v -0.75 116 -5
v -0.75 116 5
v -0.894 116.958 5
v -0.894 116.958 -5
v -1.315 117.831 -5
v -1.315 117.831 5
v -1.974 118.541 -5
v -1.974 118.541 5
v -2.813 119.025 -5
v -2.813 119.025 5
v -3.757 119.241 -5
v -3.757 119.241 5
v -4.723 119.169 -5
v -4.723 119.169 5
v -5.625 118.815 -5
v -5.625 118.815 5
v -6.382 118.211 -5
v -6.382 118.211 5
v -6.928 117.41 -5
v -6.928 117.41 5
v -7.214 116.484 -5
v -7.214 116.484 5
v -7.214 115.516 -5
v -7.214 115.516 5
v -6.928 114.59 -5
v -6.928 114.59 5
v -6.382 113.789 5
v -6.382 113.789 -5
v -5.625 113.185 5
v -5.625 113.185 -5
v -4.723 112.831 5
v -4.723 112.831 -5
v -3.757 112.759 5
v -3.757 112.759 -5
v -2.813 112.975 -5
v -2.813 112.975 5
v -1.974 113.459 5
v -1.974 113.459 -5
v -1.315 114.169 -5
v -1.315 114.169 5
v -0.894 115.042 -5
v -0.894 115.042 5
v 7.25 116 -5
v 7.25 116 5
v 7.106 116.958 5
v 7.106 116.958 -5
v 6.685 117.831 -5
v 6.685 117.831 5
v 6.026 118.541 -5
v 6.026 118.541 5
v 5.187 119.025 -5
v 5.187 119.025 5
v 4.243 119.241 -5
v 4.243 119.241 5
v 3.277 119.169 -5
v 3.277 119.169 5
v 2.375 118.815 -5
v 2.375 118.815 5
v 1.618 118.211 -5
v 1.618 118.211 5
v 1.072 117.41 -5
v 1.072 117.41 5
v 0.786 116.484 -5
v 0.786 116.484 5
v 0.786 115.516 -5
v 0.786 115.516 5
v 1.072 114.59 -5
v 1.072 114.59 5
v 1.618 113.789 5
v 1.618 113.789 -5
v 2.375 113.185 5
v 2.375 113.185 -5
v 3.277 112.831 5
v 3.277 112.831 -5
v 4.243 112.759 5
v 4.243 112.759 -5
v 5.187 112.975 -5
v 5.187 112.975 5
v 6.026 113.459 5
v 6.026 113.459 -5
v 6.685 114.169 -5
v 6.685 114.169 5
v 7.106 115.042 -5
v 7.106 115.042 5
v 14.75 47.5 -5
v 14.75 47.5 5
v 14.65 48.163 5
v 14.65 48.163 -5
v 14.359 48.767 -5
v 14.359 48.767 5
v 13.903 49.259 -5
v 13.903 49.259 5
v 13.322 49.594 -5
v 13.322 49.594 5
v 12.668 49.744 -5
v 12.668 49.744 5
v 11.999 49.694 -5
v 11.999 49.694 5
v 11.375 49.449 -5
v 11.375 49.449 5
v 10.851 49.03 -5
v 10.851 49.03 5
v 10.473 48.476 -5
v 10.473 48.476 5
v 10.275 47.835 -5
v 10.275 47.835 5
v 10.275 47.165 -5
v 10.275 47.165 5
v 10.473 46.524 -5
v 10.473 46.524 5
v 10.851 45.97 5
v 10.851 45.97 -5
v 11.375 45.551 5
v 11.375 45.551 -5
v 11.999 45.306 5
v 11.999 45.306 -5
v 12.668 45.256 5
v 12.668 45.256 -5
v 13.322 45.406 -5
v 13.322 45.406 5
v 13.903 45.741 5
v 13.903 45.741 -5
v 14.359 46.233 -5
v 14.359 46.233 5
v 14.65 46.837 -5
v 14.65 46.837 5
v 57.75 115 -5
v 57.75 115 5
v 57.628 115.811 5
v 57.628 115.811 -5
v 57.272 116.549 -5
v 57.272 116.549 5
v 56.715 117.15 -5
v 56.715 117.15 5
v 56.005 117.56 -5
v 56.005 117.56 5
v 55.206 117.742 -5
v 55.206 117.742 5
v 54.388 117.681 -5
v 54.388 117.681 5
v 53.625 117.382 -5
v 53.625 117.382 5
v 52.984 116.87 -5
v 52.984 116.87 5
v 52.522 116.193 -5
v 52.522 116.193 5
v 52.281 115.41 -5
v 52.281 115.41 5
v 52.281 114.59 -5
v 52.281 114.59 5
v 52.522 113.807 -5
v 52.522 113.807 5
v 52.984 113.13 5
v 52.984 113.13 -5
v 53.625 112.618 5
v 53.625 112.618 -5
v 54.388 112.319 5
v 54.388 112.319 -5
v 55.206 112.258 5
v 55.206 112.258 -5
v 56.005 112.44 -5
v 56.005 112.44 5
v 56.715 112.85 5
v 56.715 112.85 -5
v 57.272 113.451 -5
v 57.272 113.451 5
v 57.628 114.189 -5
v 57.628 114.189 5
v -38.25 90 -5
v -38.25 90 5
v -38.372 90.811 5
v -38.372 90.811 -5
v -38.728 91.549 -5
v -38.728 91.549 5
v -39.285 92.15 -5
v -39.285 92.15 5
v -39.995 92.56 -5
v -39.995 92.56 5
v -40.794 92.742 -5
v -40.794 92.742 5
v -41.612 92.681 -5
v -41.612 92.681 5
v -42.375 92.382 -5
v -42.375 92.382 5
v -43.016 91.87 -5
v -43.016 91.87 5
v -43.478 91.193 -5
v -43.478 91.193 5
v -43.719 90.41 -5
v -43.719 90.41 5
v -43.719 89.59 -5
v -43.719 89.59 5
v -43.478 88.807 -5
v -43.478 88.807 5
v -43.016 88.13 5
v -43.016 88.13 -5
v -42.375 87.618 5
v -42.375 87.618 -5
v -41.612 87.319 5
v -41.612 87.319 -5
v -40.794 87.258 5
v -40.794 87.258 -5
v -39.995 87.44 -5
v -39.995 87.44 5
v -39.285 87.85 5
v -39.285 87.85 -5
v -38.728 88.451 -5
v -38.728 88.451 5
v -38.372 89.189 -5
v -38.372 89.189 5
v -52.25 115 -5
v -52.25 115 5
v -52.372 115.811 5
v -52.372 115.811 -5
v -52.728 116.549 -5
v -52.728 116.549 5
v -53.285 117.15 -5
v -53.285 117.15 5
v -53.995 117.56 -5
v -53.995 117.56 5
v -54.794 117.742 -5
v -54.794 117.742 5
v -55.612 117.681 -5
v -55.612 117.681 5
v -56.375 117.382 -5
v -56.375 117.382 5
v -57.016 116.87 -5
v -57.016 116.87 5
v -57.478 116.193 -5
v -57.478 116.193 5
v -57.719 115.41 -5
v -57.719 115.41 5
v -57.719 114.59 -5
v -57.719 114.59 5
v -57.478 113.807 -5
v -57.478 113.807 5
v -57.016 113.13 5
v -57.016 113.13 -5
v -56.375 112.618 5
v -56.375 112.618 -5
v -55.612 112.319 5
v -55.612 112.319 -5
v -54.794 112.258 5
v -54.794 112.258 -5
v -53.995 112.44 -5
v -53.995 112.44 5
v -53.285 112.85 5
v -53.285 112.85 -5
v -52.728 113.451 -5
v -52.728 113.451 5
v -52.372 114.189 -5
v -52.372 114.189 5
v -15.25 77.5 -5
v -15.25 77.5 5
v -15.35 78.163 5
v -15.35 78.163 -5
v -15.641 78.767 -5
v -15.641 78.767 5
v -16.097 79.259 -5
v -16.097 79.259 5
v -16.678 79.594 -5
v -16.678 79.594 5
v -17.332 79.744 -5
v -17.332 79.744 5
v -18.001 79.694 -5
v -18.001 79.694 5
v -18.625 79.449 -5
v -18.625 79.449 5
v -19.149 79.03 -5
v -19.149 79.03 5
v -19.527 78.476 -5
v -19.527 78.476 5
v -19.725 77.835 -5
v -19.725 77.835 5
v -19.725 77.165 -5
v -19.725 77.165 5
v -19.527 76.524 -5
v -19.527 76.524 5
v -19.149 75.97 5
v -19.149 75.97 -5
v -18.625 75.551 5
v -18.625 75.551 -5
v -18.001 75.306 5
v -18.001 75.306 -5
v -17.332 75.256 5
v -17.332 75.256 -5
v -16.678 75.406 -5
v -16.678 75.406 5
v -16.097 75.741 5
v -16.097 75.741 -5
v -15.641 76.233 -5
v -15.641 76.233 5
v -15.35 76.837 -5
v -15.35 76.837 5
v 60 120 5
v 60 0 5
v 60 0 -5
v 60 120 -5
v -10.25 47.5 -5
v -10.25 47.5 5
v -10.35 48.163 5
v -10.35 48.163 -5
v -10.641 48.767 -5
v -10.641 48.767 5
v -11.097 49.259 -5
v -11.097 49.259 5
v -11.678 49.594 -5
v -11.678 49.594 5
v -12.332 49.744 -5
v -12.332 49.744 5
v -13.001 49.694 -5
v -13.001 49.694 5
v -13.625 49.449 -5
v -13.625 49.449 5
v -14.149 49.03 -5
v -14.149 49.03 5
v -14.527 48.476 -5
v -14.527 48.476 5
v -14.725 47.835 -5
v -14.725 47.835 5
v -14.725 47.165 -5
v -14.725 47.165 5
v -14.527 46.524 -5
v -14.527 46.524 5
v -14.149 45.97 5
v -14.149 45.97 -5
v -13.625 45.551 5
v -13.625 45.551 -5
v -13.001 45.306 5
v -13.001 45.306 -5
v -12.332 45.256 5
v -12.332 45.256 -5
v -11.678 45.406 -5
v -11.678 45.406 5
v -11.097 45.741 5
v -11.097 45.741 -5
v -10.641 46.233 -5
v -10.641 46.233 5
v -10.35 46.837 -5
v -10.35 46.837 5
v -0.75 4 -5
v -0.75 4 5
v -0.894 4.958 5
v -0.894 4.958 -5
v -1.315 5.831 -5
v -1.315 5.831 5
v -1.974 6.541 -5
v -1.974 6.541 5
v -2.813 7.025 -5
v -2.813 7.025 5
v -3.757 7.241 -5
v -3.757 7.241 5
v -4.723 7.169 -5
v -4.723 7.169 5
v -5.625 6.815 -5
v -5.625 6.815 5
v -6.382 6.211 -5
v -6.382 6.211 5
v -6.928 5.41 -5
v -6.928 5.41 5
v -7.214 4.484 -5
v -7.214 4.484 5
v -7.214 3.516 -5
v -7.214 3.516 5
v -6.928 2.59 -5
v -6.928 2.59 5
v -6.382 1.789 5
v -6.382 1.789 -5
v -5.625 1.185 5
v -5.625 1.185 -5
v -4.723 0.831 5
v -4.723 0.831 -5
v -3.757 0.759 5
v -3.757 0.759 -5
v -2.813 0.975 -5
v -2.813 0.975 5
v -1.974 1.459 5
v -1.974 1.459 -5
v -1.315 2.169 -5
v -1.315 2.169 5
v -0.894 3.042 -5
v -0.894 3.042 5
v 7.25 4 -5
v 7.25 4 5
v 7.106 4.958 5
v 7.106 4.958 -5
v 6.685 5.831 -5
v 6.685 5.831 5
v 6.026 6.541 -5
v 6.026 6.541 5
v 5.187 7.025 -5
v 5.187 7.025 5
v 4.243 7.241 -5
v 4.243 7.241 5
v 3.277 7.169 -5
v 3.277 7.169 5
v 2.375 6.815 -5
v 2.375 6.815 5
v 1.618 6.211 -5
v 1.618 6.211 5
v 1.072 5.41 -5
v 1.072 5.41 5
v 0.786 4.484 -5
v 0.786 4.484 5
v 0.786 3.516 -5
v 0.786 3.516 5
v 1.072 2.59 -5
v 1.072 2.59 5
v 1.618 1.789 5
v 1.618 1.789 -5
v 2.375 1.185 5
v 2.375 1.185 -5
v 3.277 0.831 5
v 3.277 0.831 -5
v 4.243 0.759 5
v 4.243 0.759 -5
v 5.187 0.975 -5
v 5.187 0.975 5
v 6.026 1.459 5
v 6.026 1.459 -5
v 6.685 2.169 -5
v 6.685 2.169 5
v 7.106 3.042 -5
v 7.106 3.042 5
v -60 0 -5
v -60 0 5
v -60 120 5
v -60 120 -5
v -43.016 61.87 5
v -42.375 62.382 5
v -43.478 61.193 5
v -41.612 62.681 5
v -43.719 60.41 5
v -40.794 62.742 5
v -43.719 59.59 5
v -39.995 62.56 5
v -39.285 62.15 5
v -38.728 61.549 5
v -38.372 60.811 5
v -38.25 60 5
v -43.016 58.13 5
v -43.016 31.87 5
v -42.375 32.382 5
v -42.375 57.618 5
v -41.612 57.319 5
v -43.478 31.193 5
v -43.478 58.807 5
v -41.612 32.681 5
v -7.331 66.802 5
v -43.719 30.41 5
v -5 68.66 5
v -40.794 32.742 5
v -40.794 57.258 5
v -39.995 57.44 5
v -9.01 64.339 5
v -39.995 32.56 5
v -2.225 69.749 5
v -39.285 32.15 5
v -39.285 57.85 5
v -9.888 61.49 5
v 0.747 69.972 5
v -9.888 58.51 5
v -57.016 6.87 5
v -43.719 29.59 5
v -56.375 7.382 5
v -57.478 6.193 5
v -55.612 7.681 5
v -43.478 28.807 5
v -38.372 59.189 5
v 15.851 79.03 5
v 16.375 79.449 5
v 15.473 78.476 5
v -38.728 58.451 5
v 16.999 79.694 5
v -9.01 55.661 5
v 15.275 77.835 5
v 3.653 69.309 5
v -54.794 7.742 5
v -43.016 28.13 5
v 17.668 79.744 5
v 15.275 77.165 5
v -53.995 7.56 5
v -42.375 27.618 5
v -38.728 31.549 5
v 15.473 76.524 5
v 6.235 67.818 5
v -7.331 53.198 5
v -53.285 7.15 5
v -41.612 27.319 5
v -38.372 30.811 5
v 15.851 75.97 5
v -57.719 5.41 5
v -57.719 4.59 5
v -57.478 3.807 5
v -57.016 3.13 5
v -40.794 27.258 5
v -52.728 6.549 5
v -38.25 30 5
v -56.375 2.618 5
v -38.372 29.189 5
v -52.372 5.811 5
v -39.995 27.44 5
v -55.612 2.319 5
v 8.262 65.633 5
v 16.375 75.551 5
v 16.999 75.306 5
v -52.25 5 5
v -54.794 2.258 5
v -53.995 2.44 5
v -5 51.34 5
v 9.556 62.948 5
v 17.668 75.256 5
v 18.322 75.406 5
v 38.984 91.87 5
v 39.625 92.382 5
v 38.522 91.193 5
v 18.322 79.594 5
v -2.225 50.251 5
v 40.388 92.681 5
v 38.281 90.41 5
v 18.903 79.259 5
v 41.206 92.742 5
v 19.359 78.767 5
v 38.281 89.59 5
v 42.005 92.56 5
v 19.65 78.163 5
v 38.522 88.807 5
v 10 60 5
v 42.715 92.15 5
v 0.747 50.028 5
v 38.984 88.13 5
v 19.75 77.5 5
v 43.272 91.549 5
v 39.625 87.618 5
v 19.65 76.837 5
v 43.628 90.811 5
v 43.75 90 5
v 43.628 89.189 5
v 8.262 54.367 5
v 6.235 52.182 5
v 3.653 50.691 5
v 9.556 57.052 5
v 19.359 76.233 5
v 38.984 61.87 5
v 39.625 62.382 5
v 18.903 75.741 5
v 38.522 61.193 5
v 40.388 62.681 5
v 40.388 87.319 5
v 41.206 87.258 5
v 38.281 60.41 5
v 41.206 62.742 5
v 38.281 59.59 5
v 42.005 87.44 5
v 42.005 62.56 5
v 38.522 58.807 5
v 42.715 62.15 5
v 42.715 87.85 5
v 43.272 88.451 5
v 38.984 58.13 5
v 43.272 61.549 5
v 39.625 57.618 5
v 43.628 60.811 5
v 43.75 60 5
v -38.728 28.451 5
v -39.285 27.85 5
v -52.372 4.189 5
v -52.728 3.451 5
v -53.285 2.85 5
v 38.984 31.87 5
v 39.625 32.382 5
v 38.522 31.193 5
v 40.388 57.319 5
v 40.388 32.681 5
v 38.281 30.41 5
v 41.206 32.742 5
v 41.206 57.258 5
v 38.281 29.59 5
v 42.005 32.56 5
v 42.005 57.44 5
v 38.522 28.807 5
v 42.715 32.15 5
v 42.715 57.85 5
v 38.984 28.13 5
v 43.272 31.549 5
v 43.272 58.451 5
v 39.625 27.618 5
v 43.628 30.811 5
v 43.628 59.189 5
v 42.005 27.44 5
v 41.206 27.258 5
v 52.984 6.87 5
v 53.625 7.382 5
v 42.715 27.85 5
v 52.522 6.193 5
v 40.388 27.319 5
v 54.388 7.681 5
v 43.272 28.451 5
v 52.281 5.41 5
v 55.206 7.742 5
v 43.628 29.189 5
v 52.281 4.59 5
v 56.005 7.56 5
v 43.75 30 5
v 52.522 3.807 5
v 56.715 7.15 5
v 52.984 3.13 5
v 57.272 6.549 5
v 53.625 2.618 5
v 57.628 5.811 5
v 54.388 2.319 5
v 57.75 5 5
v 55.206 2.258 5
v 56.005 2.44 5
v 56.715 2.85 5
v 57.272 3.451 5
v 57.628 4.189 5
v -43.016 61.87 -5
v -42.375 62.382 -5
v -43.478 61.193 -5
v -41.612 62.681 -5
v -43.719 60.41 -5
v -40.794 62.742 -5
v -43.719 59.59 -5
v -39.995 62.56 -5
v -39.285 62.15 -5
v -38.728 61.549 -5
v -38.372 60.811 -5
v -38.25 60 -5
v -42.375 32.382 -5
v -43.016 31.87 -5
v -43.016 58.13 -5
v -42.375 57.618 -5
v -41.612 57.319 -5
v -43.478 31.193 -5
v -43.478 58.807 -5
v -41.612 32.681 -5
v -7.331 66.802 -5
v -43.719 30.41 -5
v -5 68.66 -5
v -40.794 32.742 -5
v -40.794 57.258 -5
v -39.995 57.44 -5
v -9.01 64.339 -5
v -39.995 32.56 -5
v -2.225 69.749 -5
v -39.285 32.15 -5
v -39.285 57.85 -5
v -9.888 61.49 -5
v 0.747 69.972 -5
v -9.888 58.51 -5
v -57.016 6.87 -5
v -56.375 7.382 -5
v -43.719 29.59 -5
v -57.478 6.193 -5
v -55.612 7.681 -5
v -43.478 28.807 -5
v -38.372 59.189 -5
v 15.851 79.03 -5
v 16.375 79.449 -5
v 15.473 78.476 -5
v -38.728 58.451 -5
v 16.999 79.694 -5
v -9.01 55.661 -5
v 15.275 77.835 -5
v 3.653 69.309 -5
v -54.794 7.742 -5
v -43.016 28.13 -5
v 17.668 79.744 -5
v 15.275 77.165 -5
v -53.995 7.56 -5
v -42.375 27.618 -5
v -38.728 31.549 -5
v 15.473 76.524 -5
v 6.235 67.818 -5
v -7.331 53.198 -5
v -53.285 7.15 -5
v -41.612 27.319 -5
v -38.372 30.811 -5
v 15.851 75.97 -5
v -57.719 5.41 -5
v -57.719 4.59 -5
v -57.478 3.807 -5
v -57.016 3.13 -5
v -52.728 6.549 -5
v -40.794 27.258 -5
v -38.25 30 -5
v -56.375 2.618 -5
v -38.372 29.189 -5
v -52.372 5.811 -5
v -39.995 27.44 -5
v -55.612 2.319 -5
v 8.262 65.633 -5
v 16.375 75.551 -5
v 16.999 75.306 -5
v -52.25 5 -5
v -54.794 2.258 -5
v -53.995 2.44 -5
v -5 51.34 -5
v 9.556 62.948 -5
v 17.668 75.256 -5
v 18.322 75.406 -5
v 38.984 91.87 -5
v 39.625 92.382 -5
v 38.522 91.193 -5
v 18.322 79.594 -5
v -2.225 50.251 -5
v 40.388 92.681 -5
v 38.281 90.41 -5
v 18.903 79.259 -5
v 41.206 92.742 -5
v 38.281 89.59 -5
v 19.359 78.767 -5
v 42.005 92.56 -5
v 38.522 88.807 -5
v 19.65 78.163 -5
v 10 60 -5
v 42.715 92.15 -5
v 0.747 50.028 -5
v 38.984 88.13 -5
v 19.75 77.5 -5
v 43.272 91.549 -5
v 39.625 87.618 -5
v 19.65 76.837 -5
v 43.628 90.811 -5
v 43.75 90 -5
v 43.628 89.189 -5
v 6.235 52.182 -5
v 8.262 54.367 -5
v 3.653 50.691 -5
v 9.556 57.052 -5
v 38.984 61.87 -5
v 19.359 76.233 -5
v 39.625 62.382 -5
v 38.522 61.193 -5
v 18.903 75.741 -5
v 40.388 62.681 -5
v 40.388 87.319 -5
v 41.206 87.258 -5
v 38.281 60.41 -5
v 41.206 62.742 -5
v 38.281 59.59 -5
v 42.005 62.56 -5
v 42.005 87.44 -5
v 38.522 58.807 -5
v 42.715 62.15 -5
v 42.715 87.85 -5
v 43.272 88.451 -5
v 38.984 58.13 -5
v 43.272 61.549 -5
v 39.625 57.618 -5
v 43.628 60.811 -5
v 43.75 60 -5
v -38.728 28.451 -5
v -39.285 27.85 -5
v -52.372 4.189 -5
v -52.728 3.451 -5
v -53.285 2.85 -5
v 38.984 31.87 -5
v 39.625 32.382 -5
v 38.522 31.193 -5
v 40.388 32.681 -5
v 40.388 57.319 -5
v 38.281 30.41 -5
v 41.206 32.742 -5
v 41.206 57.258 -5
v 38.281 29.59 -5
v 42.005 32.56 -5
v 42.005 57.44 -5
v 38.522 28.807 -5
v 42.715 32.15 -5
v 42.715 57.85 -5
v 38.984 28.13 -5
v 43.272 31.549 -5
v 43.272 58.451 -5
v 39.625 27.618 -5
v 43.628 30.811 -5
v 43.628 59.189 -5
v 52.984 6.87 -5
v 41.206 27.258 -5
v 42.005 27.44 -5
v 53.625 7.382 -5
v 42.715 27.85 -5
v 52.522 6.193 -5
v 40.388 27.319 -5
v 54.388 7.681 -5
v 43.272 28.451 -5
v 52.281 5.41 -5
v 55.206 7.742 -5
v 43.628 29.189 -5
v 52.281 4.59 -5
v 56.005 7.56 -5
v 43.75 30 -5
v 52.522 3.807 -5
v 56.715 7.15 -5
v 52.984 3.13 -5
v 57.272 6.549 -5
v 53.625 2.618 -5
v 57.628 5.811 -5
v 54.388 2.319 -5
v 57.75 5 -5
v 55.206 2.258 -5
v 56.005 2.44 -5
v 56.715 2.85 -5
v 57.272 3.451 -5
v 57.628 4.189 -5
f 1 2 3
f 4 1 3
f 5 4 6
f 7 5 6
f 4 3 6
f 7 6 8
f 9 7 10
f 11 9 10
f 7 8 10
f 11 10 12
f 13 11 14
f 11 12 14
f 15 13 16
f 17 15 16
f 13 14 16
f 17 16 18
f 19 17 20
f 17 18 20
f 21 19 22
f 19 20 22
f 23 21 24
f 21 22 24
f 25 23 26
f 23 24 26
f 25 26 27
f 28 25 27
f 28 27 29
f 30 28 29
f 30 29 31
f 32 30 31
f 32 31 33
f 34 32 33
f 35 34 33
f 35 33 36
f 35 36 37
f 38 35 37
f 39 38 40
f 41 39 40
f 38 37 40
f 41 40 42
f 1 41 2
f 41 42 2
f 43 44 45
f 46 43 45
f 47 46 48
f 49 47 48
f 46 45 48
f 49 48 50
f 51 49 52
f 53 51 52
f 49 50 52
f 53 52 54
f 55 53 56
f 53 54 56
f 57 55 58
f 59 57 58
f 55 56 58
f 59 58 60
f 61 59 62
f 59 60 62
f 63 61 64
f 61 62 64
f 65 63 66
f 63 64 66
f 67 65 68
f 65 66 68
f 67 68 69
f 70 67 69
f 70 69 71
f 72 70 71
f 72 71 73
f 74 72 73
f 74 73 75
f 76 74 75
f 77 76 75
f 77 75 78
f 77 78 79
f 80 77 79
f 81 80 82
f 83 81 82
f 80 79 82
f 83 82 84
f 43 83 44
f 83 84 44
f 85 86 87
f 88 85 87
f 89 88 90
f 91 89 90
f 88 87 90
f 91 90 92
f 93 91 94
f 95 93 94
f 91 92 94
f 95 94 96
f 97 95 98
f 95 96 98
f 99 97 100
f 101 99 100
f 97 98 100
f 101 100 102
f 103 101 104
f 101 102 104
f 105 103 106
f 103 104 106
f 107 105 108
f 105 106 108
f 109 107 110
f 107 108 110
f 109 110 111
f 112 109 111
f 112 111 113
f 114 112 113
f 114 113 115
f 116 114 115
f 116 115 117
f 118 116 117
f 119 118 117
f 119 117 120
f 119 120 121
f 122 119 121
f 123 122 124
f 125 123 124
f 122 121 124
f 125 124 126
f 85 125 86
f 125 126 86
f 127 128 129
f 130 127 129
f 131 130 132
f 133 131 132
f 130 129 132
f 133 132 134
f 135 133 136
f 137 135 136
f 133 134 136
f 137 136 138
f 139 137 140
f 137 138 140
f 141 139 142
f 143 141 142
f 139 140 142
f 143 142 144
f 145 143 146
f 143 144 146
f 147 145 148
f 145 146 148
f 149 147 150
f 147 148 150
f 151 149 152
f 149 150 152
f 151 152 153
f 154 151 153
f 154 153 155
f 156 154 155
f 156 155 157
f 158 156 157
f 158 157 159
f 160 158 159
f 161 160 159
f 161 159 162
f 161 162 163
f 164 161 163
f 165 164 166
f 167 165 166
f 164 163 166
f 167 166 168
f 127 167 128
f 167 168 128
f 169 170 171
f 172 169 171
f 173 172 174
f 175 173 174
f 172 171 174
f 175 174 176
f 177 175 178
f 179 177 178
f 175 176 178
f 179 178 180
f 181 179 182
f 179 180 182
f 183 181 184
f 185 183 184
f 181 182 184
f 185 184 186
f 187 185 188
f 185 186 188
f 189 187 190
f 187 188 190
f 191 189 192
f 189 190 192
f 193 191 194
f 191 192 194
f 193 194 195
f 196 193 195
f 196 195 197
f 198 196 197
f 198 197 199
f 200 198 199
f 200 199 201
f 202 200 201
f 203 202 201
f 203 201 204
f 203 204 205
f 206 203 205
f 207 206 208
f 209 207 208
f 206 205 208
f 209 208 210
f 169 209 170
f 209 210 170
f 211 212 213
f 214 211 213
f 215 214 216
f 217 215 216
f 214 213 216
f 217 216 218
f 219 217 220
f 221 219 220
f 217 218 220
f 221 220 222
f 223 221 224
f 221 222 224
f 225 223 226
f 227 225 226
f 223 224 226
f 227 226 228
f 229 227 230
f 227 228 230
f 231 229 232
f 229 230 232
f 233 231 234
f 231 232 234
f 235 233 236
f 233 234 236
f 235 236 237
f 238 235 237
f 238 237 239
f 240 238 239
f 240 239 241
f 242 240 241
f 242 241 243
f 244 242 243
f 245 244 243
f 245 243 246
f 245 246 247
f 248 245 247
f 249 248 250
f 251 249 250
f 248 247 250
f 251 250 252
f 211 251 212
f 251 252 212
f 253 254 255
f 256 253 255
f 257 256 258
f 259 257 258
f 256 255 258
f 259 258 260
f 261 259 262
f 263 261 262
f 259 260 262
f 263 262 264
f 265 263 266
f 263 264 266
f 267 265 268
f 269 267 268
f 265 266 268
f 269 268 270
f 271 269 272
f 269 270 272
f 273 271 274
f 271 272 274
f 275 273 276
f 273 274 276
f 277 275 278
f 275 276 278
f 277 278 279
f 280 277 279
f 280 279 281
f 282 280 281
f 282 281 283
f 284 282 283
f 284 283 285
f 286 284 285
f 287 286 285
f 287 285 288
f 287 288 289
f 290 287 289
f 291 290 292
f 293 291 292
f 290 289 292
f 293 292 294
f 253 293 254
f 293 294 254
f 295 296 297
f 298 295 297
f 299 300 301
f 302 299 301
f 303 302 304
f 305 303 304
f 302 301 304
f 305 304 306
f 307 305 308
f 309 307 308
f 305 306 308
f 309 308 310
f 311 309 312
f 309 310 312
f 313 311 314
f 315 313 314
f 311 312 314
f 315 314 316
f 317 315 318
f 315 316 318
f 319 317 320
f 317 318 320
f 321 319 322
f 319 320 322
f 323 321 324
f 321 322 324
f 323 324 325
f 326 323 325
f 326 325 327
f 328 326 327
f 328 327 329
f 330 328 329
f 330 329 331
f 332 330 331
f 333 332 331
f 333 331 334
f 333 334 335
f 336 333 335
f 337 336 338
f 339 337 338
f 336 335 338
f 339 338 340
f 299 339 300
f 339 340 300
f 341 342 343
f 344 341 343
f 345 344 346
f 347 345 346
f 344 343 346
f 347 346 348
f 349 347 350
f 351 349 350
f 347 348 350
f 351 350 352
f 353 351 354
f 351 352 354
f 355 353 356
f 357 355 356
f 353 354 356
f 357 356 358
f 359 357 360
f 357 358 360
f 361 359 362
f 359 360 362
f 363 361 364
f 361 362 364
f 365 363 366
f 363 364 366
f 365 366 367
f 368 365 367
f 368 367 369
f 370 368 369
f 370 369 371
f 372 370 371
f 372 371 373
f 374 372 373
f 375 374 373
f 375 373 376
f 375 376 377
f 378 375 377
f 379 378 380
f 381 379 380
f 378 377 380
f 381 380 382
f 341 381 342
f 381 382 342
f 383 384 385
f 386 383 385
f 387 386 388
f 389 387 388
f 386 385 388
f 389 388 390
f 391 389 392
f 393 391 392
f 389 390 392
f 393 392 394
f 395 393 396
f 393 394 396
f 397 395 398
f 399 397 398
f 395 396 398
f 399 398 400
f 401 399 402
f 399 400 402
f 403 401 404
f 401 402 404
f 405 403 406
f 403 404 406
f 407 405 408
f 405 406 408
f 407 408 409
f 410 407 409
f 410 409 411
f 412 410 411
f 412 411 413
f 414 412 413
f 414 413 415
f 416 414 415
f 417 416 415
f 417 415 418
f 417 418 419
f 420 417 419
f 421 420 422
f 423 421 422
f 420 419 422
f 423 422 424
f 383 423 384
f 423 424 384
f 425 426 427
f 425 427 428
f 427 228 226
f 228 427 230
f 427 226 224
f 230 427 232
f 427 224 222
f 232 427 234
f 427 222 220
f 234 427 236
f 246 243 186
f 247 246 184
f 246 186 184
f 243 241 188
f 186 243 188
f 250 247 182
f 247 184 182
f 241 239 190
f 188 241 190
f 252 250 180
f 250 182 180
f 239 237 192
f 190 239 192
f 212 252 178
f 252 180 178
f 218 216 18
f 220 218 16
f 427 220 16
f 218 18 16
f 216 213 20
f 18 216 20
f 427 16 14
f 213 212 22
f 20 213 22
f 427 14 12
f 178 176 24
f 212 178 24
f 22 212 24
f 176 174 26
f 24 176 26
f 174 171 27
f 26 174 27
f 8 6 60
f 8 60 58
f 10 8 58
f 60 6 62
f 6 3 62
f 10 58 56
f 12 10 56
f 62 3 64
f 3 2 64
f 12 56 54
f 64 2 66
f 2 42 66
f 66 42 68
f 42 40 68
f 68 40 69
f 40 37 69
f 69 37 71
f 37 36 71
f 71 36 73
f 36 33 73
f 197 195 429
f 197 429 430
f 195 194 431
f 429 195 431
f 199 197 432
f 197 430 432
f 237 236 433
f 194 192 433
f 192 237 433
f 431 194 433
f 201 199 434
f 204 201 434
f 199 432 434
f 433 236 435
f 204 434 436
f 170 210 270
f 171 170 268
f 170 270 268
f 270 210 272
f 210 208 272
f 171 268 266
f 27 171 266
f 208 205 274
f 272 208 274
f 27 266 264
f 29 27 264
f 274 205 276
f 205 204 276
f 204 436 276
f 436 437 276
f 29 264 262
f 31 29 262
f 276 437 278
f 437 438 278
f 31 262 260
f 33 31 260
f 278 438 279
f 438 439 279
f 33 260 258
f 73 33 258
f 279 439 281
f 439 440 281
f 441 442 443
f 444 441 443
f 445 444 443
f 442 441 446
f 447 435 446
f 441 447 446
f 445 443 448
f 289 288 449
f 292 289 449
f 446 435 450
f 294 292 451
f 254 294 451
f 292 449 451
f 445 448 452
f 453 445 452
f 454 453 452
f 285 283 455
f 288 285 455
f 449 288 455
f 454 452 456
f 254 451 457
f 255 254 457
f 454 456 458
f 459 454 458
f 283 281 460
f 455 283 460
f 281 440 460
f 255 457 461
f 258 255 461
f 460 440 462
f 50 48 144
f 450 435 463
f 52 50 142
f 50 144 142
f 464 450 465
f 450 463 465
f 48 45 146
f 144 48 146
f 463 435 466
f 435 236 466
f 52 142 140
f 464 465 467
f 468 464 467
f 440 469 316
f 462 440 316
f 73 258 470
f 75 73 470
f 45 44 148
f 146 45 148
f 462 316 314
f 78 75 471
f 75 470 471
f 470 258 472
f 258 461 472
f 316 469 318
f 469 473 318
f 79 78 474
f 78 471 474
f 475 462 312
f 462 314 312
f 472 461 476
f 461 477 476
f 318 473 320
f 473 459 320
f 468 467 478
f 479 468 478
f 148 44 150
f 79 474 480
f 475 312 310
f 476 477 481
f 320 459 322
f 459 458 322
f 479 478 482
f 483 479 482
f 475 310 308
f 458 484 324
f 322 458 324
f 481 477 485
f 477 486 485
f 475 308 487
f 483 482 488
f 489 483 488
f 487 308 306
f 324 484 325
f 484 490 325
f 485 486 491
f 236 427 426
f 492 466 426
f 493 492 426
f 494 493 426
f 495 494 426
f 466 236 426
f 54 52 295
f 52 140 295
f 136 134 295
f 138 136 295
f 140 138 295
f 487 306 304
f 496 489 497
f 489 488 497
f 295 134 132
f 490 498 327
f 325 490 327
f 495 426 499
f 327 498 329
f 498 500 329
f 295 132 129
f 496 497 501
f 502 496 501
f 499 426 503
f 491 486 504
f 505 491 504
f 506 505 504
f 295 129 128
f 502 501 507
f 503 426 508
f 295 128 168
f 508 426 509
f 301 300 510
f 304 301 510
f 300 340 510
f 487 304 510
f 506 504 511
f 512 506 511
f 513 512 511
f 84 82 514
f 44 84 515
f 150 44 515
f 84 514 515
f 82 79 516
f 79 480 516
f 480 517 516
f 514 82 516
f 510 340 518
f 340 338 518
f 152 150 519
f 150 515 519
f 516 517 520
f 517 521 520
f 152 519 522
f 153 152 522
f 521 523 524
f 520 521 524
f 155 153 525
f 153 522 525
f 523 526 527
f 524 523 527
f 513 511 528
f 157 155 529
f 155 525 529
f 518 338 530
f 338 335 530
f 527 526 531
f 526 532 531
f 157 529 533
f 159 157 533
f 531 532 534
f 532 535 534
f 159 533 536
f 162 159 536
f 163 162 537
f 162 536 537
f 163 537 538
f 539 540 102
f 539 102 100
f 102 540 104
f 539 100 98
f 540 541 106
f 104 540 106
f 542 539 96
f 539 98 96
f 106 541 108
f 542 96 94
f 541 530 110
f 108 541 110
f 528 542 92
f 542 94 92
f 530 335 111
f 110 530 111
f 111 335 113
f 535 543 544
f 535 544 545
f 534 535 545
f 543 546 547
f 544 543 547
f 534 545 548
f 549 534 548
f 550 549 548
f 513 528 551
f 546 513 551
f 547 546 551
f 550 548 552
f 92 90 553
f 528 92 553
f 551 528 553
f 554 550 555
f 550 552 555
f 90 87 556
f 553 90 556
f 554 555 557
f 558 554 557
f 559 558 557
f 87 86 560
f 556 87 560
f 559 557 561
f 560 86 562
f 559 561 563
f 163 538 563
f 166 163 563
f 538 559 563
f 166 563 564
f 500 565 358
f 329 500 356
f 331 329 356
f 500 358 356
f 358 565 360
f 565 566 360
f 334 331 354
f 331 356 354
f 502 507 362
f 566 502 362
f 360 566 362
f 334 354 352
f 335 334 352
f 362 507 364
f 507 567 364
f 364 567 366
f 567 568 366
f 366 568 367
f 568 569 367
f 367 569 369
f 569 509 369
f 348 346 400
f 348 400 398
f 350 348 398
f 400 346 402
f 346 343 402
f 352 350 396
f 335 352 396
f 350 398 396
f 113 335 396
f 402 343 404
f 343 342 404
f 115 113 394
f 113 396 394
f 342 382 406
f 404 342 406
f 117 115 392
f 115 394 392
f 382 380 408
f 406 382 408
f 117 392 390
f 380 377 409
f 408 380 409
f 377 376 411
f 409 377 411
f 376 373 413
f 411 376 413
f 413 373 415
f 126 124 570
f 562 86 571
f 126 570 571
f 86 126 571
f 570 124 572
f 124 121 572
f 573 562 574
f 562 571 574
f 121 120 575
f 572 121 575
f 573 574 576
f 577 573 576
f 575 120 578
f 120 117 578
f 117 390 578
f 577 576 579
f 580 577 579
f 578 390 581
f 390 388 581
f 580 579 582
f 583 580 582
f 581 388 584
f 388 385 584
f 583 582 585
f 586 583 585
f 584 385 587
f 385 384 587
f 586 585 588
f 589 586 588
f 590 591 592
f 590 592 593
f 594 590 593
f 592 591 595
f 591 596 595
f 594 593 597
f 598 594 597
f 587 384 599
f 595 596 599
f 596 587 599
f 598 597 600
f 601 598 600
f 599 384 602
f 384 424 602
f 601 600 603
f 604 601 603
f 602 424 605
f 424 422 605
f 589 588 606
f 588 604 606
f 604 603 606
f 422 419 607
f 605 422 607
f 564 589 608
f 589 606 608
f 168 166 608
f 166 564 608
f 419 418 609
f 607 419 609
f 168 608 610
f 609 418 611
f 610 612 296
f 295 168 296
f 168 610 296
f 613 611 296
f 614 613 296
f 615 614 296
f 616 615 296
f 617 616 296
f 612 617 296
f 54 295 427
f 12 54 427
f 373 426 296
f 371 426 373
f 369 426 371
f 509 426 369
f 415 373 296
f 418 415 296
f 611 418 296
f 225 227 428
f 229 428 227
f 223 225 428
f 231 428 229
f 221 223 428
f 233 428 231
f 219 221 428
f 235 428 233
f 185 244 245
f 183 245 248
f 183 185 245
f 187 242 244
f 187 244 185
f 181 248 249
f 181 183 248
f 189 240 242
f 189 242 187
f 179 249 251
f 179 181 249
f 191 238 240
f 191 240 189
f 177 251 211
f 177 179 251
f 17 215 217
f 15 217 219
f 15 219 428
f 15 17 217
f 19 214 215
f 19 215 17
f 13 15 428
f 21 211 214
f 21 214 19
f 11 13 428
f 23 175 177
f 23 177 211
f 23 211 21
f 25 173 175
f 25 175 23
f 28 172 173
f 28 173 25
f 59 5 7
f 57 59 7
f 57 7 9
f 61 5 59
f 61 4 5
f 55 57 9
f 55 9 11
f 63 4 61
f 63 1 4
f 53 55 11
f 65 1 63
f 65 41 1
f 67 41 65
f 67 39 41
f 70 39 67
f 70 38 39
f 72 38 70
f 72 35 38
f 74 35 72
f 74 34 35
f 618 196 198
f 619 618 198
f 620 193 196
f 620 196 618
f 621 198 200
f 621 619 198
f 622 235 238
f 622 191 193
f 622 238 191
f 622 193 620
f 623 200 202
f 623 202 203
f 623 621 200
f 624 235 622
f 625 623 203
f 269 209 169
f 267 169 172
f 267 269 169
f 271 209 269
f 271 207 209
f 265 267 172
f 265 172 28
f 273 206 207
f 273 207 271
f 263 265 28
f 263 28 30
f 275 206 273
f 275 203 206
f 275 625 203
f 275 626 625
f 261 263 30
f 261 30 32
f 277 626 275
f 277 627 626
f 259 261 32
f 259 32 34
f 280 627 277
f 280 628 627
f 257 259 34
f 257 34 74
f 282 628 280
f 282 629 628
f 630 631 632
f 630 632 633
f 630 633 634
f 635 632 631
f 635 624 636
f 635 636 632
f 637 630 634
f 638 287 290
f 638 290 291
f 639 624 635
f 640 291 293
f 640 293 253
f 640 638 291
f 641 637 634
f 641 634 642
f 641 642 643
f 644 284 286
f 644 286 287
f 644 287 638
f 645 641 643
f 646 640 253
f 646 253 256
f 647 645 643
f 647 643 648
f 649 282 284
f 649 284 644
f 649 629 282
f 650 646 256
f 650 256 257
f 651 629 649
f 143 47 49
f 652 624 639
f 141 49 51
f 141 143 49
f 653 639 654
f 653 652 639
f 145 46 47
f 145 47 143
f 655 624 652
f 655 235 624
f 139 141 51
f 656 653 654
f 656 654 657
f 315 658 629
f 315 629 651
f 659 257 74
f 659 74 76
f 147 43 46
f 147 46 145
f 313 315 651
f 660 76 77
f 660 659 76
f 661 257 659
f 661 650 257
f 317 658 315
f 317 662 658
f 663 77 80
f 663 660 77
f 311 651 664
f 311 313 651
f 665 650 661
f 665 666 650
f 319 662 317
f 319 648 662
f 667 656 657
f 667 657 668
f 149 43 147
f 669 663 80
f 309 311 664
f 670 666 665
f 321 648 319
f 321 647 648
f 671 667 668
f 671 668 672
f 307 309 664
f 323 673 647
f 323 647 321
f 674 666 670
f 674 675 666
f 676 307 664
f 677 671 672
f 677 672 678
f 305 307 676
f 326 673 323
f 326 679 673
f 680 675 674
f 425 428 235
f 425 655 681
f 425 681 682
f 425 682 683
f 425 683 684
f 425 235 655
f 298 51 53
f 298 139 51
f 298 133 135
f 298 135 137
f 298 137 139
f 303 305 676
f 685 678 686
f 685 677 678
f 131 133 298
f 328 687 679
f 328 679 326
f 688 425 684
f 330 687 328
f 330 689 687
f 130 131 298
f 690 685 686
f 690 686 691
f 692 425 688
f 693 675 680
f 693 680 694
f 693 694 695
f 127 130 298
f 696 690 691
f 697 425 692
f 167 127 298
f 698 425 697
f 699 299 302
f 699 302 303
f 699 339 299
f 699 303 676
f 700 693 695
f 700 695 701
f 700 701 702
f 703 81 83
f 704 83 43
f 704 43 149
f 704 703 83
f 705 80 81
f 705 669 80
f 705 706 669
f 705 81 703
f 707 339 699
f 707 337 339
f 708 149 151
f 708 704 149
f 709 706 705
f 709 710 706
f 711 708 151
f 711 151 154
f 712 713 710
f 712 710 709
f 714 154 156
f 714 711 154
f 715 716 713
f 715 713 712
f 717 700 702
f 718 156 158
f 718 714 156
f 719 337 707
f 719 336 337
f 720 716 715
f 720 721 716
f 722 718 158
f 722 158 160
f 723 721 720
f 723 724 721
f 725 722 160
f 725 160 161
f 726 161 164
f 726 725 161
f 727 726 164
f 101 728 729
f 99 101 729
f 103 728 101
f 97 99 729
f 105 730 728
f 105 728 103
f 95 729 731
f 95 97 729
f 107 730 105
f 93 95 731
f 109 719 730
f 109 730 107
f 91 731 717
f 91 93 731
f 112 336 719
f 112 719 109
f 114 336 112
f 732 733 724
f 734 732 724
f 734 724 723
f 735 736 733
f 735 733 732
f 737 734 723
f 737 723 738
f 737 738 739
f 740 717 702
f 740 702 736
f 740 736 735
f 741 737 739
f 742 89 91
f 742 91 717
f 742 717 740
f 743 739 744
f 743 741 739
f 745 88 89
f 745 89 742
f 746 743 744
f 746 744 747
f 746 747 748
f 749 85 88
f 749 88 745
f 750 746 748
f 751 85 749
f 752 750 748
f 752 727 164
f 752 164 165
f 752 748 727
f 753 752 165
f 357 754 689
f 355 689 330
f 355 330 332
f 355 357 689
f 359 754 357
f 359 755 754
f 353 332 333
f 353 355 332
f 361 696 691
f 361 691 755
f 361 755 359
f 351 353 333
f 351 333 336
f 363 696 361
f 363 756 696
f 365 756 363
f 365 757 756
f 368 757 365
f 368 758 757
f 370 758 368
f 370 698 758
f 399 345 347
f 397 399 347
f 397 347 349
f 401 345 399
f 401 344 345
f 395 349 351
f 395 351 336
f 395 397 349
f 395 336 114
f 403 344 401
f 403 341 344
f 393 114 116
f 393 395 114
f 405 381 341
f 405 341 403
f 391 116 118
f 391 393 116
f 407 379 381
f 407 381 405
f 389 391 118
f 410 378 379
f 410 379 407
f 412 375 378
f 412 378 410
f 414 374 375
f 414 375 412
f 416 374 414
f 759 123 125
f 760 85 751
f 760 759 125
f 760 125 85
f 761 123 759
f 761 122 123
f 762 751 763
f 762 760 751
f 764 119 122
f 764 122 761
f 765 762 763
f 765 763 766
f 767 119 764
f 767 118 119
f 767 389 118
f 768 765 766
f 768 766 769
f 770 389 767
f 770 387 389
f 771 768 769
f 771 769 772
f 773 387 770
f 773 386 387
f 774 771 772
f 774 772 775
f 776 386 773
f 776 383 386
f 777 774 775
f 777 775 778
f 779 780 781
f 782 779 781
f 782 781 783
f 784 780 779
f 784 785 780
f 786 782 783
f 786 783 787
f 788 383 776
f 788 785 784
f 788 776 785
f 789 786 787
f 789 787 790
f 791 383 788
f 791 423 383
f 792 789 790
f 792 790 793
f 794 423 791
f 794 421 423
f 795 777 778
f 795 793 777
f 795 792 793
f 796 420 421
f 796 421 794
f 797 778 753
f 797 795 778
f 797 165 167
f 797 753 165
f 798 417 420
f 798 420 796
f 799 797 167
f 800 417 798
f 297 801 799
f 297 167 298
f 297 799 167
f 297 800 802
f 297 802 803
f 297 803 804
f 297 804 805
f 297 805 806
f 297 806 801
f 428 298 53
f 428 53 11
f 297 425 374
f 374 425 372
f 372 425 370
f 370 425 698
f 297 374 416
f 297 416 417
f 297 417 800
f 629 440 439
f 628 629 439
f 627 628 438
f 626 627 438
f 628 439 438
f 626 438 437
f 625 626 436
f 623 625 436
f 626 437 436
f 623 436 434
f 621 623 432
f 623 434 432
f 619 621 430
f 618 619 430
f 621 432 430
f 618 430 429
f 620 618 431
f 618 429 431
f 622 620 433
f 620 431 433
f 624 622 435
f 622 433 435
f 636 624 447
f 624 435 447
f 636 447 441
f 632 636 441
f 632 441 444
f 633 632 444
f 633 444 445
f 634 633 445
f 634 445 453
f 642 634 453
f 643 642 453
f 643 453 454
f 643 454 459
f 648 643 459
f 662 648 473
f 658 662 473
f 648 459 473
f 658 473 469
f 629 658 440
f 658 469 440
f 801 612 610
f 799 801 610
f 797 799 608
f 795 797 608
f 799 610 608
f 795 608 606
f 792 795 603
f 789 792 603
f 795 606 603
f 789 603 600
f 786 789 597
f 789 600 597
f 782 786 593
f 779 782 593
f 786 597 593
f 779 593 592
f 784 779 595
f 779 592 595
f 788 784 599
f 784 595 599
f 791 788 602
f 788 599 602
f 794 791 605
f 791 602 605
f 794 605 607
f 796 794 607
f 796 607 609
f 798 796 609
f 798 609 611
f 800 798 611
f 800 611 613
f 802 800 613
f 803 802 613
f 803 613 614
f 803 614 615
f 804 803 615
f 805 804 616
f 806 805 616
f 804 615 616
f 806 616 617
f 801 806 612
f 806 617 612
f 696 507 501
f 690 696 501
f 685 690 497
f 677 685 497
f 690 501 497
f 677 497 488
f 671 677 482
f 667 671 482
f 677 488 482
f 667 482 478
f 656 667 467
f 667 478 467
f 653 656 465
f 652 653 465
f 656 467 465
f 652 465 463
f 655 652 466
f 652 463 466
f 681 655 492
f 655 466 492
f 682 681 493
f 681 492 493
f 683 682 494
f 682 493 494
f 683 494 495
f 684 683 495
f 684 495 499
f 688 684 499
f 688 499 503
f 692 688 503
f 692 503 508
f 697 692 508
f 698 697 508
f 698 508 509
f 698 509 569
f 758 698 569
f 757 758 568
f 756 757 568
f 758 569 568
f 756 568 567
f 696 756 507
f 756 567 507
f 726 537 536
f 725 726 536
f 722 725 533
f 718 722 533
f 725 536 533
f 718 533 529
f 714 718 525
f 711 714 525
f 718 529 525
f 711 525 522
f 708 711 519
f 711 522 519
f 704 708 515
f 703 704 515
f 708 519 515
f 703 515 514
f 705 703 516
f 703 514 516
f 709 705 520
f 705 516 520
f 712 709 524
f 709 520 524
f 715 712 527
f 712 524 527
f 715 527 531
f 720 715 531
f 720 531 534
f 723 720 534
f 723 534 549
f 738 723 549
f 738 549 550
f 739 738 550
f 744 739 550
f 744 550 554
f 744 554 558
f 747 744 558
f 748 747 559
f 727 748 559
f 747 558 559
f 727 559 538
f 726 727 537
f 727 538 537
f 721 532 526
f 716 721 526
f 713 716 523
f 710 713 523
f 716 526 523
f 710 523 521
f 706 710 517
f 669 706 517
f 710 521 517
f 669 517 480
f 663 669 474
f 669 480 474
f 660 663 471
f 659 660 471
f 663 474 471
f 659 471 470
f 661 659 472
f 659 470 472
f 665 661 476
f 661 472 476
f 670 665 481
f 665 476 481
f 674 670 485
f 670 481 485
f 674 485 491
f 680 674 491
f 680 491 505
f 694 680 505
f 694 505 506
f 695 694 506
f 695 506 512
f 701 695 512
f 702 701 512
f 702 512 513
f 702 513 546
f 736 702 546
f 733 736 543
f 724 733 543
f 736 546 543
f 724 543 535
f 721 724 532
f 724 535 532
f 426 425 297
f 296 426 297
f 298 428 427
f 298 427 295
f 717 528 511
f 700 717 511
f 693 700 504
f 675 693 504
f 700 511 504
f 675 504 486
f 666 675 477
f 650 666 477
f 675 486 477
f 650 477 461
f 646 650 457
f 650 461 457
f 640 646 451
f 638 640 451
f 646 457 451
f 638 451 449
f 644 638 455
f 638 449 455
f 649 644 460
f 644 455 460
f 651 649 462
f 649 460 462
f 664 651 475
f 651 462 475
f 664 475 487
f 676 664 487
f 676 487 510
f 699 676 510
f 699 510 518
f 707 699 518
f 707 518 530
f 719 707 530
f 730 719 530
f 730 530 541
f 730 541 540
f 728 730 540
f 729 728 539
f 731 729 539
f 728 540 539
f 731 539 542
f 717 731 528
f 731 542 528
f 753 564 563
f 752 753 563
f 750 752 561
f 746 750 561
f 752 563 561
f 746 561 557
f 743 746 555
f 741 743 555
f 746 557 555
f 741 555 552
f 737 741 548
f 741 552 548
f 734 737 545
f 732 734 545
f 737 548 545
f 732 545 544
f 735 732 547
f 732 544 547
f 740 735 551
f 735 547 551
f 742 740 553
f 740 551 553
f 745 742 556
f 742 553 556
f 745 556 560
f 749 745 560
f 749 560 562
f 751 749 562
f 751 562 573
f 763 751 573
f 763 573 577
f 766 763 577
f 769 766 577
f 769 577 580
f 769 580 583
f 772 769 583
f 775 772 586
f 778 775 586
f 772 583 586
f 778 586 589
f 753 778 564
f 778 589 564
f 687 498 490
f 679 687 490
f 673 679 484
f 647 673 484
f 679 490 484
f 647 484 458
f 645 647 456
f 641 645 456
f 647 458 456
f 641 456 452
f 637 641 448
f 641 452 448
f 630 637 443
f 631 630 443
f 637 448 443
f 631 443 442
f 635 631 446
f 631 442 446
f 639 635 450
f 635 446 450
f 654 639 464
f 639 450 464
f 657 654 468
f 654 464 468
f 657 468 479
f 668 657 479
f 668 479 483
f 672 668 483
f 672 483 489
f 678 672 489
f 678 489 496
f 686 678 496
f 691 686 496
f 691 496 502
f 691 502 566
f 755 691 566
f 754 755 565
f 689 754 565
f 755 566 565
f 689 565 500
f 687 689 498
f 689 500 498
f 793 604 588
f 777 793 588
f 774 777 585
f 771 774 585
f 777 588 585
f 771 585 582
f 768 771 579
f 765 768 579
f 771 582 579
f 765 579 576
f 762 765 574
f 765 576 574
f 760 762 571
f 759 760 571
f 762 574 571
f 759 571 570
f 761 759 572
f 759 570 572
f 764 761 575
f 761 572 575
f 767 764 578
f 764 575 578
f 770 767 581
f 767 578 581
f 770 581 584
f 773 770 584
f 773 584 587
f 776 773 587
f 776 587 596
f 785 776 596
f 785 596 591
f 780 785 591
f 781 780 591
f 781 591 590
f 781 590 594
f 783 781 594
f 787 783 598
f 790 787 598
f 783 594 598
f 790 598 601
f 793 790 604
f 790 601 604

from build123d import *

# Parameters (mm, degrees)
SKETCH1_W           = 120
SKETCH1_H           = 10
BOSS_EXTRUDE1_DEPTH = 120
SKETCH2_R           = 2.25
SKETCH2_R_2         = 2.75
SKETCH2_R_3         = 10
SKETCH2_R_4         = 3.25
CUT_EXTRUDE1_DEPTH  = 10


with BuildPart() as part:
    # Sketch1 → Boss-Extrude1 (new body)
    with BuildSketch(Plane(origin=(0, 0, 0), x_dir=(1, 0, 0), z_dir=(0, 1, 0))):
        Rectangle(SKETCH1_W, SKETCH1_H)
    extrude(amount=BOSS_EXTRUDE1_DEPTH)

    # Sketch2 → Cut-Extrude1 (cut)
    with BuildSketch(Plane.XY.offset(5)):
        with Locations((-17.5, 77.5)):
            Circle(SKETCH2_R)
        with Locations((-12.5, 47.5)):
            Circle(SKETCH2_R)
        with Locations((12.5, 47.5)):
            Circle(SKETCH2_R)
        with Locations((17.5, 77.5)):
            Circle(SKETCH2_R)
        with Locations((55, 5)):
            Circle(SKETCH2_R_2)
        with Locations((55, 115)):
            Circle(SKETCH2_R_2)
        with Locations((0, 60)):
            Circle(SKETCH2_R_3)
        with Locations((-41, 90)):
            Circle(SKETCH2_R_2)
        with Locations((-41, 60)):
            Circle(SKETCH2_R_2)
        with Locations((-41, 30)):
            Circle(SKETCH2_R_2)
        with Locations((41, 30)):
            Circle(SKETCH2_R_2)
        with Locations((41, 60)):
            Circle(SKETCH2_R_2)
        with Locations((-4, 116)):
            Circle(SKETCH2_R_4)
        with Locations((4, 116)):
            Circle(SKETCH2_R_4)
        with Locations((41, 90)):
            Circle(SKETCH2_R_2)
        with Locations((-4, 4)):
            Circle(SKETCH2_R_4)
        with Locations((4, 4)):
            Circle(SKETCH2_R_4)
        with Locations((-55, 5)):
            Circle(SKETCH2_R_2)
        with Locations((-55, 115)):
            Circle(SKETCH2_R_2)
    extrude(amount=-CUT_EXTRUDE1_DEPTH, mode=Mode.SUBTRACT)


solid = part.part
